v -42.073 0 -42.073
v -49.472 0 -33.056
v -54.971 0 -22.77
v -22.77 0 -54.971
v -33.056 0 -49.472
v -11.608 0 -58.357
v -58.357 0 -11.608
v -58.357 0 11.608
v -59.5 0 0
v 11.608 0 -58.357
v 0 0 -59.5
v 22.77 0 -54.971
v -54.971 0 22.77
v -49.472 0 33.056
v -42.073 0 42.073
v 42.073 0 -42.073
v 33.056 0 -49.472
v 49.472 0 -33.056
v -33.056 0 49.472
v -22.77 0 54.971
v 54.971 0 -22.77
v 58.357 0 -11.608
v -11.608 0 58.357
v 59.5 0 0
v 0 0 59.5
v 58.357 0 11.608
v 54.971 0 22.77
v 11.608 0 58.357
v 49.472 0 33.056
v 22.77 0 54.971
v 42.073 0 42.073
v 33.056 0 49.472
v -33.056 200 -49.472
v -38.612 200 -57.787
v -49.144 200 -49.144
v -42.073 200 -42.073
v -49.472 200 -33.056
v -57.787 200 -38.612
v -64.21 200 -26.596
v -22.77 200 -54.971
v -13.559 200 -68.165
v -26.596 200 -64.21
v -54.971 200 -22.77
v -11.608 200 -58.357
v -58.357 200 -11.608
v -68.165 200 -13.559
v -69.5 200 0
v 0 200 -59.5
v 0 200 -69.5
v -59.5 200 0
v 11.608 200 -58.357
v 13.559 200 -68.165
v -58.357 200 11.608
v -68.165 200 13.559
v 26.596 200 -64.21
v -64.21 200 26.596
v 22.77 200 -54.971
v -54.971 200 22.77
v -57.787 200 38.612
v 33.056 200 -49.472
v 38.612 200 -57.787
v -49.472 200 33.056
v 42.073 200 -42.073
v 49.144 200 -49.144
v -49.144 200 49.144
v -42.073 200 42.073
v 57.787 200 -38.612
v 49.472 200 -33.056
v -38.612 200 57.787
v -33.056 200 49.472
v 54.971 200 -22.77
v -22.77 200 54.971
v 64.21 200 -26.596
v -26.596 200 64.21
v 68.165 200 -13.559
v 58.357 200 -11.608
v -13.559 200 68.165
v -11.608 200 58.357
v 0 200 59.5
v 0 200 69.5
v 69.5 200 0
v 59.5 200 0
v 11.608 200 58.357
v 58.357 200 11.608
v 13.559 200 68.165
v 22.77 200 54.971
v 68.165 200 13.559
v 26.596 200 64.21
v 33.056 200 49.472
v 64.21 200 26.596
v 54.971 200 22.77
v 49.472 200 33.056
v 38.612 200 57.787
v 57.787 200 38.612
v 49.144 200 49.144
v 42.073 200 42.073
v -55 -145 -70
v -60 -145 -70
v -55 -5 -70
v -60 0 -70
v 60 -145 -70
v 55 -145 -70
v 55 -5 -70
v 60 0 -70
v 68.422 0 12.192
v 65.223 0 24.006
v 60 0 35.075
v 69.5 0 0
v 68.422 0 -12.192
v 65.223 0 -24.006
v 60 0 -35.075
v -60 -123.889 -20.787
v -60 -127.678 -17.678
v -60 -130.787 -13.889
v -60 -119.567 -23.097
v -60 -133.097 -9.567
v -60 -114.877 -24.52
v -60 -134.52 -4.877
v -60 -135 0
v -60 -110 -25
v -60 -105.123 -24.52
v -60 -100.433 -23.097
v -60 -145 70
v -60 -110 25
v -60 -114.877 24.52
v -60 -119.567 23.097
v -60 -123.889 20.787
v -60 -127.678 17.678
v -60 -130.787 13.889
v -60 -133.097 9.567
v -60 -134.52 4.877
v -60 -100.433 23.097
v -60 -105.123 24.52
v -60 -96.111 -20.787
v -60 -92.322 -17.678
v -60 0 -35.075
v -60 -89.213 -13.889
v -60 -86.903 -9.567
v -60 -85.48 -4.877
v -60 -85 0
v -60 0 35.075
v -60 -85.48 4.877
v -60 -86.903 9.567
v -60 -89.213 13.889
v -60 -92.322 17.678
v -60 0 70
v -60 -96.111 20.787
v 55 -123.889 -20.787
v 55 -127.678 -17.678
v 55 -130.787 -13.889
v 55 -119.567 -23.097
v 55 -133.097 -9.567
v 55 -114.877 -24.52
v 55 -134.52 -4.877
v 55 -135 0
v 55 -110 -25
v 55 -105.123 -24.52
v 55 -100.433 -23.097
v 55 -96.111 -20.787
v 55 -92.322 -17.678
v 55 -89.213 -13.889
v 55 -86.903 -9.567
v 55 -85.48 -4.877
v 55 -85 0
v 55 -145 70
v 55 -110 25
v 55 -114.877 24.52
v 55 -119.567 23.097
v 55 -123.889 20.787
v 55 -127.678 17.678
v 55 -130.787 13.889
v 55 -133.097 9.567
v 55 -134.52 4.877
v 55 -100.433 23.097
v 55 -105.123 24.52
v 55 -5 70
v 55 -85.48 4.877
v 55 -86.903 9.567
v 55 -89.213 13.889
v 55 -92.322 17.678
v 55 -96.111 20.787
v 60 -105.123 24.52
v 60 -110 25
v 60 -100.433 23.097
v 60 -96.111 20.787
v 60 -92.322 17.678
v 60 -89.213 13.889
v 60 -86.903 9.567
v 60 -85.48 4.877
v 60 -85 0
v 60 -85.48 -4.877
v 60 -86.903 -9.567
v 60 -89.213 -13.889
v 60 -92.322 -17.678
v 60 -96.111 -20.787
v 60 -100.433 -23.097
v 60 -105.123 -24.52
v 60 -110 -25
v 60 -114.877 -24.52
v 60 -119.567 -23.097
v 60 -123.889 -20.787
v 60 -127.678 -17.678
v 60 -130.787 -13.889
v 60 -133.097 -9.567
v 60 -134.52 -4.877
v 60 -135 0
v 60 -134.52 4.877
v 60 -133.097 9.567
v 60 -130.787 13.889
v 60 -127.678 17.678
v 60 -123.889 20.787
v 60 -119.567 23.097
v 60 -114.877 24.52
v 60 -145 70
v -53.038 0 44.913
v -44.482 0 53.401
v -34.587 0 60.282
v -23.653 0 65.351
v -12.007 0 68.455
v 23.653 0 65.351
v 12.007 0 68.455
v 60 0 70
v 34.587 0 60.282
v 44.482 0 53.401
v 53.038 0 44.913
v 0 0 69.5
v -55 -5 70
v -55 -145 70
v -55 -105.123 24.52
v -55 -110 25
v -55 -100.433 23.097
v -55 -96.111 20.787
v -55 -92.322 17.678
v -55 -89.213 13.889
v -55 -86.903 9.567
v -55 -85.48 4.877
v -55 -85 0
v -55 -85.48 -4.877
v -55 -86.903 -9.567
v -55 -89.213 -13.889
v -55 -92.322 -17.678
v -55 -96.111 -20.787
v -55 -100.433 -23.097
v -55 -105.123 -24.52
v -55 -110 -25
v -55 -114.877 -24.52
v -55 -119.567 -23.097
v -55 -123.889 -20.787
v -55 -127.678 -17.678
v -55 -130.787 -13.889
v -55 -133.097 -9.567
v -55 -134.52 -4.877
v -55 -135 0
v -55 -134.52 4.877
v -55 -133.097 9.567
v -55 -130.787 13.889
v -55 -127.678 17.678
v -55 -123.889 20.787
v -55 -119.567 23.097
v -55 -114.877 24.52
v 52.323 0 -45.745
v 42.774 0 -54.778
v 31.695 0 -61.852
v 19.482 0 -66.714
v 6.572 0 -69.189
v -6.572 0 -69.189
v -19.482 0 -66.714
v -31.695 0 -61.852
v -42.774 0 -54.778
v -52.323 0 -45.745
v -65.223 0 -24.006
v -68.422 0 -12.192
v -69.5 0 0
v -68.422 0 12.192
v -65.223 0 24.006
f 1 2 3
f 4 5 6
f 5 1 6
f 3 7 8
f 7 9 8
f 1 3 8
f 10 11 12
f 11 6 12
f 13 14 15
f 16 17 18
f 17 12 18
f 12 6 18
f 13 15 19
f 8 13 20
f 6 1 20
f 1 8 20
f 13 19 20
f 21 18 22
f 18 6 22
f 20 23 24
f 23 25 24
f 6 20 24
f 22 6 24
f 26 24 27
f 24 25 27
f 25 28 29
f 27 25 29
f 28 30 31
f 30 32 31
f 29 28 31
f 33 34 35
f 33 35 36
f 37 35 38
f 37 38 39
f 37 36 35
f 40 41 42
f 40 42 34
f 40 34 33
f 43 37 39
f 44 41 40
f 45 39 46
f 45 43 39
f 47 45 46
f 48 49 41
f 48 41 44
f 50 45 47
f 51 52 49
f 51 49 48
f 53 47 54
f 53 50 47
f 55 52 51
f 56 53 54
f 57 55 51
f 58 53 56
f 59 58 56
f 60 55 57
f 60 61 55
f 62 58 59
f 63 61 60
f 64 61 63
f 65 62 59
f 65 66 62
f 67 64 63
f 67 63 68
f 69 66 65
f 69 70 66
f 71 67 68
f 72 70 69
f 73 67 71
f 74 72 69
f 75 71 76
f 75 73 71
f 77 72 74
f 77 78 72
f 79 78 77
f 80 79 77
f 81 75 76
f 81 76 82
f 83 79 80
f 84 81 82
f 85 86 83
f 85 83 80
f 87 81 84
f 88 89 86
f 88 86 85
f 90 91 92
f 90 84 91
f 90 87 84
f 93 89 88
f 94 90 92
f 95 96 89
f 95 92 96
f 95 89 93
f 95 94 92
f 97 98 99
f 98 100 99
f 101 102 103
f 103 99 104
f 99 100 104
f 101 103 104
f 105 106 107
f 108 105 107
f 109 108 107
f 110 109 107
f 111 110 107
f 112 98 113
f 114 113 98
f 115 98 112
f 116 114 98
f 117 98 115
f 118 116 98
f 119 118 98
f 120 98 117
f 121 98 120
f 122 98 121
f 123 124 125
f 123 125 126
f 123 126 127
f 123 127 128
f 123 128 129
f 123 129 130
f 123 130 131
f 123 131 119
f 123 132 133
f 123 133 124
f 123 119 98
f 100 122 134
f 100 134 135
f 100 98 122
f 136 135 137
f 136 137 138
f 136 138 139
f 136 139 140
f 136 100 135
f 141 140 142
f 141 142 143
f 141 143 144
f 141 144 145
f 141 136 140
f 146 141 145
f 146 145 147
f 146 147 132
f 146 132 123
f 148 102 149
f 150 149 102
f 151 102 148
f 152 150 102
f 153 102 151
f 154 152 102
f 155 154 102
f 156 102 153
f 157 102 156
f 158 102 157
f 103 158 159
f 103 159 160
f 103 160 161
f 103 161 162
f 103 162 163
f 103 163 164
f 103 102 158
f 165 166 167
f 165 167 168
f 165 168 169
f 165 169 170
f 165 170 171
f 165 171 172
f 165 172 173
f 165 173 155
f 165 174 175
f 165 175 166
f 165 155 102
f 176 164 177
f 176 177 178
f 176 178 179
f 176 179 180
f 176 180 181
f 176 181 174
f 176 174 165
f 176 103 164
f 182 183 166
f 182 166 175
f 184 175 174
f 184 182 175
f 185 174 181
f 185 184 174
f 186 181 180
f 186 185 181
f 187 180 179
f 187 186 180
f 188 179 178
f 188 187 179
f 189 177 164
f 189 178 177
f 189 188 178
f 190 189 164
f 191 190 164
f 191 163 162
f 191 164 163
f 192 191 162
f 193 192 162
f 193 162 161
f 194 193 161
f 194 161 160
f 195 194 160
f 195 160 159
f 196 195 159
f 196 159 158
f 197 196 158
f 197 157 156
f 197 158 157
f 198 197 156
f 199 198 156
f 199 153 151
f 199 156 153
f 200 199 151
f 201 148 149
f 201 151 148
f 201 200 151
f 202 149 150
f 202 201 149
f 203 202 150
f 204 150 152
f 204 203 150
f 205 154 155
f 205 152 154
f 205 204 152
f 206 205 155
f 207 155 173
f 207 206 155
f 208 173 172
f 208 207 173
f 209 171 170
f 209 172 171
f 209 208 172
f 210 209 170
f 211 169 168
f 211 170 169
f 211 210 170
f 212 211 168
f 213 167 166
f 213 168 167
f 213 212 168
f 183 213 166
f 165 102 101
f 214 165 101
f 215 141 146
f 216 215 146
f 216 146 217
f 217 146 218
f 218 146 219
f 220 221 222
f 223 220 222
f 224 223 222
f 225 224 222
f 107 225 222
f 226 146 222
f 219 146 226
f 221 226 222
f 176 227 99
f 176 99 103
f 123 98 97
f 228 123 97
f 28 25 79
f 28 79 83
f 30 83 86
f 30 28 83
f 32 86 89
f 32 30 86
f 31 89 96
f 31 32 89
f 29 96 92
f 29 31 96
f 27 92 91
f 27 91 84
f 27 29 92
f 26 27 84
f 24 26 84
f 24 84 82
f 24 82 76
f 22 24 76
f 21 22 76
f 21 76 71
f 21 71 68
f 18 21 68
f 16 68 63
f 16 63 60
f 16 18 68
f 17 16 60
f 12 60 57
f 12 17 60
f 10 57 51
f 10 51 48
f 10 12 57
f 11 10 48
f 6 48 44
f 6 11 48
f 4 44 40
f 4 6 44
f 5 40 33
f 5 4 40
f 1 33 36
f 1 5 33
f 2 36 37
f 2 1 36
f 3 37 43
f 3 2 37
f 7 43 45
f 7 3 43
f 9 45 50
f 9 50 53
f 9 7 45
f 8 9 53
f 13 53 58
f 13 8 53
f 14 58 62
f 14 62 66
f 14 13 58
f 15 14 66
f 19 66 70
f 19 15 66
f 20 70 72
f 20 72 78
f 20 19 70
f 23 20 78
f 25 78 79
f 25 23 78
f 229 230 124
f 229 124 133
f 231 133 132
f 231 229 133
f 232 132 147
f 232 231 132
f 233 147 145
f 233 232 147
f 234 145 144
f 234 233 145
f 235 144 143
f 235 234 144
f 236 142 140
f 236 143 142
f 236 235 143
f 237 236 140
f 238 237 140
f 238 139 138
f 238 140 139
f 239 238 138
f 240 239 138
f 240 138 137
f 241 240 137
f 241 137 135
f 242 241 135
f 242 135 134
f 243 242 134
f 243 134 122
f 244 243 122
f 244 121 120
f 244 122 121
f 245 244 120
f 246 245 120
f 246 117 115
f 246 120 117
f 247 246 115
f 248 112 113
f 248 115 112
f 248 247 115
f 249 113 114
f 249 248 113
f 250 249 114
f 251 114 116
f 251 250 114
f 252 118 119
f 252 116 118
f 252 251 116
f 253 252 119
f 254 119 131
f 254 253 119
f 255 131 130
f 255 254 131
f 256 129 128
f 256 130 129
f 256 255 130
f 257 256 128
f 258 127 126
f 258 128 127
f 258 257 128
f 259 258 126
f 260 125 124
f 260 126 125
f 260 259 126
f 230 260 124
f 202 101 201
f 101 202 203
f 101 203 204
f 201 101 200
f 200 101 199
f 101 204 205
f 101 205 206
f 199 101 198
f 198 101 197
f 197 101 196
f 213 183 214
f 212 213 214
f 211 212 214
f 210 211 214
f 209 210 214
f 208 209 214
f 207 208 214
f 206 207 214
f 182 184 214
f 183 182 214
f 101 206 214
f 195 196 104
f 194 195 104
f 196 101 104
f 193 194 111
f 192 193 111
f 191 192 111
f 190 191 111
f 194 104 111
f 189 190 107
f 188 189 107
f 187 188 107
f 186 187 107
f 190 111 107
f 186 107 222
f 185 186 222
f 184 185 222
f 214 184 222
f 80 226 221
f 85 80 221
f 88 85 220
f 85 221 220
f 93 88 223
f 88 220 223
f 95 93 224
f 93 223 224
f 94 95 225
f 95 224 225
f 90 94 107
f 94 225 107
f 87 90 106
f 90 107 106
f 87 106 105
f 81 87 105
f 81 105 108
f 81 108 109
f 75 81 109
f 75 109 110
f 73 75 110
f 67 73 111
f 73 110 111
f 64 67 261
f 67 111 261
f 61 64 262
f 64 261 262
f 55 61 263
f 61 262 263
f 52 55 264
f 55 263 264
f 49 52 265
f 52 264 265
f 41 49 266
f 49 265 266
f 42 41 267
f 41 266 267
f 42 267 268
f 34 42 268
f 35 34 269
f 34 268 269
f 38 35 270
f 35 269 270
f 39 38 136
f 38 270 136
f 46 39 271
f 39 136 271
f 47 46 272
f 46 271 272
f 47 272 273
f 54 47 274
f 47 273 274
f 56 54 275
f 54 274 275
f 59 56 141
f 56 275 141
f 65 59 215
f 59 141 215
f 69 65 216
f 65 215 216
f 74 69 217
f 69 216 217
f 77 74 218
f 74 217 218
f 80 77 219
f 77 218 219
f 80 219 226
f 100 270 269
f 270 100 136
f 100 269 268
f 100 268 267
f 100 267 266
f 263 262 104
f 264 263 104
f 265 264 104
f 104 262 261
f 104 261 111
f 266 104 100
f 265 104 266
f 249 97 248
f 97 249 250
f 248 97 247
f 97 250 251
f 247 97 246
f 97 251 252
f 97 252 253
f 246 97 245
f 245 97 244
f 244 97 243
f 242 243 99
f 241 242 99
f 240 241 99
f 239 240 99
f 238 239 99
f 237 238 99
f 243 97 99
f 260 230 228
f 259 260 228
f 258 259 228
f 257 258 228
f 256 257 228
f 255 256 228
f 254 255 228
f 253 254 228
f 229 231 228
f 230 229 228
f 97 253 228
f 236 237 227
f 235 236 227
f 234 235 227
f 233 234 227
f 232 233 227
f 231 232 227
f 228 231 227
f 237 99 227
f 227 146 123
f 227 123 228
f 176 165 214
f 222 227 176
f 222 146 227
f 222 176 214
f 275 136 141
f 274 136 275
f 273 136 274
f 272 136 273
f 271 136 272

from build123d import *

# Parameters (mm, degrees)
SKETCH1_R               = 69.5
SKETCH1_R_2             = 59.5
BOSS_EXTRUDE1_DEPTH     = 200
SKETCH2_W               = 120
SKETCH2_H               = 140
BOSS_EXTRUDE2_DEPTH     = 5
SKETCH3_W               = 5
SKETCH3_H               = 140
BOSS_EXTRUDE3_DEPTH     = 140
CUT_EXTRUDE1_DEPTH      = 249.334955252
CUT_EXTRUDE1_DEPTH_BACK = 249.334955252
SKETCH4_R               = 25


with BuildPart() as part:
    # Sketch1 → Boss-Extrude1 (new body)
    with BuildSketch(Plane(origin=(0, 0, 0), x_dir=(1, 0, 0), z_dir=(0, 1, 0))):
        with Locations(Location((0, 0, 0), (0, 0, 270))):
            Circle(SKETCH1_R)
        with Locations(Location((0, 0, 0), (0, 0, 270))):
            Circle(SKETCH1_R_2, mode=Mode.SUBTRACT)
    extrude(amount=BOSS_EXTRUDE1_DEPTH)

    # Sketch2 → Boss-Extrude2 (add)
    with BuildSketch(Plane.XZ):
        Rectangle(SKETCH2_W, SKETCH2_H)
    extrude(amount=BOSS_EXTRUDE2_DEPTH)

    # Sketch3 → Boss-Extrude3 (add)
    with BuildSketch(Plane.XZ.offset(5)):
        with Locations((-57.5, 0)):
            Rectangle(SKETCH3_W, SKETCH3_H)
        with Locations((57.5, 0)):
            Rectangle(SKETCH3_W, SKETCH3_H)
    extrude(amount=BOSS_EXTRUDE3_DEPTH)

    # Sketch4 → Cut-Extrude1 (cut, two sides: drawn at the far end of the back side and taken through both)
    with BuildSketch(Plane.ZY.offset(60).offset(-CUT_EXTRUDE1_DEPTH_BACK)):
        with Locations((0, -110)):
            Circle(SKETCH4_R)
    extrude(amount=CUT_EXTRUDE1_DEPTH + CUT_EXTRUDE1_DEPTH_BACK, mode=Mode.SUBTRACT)


solid = part.part
